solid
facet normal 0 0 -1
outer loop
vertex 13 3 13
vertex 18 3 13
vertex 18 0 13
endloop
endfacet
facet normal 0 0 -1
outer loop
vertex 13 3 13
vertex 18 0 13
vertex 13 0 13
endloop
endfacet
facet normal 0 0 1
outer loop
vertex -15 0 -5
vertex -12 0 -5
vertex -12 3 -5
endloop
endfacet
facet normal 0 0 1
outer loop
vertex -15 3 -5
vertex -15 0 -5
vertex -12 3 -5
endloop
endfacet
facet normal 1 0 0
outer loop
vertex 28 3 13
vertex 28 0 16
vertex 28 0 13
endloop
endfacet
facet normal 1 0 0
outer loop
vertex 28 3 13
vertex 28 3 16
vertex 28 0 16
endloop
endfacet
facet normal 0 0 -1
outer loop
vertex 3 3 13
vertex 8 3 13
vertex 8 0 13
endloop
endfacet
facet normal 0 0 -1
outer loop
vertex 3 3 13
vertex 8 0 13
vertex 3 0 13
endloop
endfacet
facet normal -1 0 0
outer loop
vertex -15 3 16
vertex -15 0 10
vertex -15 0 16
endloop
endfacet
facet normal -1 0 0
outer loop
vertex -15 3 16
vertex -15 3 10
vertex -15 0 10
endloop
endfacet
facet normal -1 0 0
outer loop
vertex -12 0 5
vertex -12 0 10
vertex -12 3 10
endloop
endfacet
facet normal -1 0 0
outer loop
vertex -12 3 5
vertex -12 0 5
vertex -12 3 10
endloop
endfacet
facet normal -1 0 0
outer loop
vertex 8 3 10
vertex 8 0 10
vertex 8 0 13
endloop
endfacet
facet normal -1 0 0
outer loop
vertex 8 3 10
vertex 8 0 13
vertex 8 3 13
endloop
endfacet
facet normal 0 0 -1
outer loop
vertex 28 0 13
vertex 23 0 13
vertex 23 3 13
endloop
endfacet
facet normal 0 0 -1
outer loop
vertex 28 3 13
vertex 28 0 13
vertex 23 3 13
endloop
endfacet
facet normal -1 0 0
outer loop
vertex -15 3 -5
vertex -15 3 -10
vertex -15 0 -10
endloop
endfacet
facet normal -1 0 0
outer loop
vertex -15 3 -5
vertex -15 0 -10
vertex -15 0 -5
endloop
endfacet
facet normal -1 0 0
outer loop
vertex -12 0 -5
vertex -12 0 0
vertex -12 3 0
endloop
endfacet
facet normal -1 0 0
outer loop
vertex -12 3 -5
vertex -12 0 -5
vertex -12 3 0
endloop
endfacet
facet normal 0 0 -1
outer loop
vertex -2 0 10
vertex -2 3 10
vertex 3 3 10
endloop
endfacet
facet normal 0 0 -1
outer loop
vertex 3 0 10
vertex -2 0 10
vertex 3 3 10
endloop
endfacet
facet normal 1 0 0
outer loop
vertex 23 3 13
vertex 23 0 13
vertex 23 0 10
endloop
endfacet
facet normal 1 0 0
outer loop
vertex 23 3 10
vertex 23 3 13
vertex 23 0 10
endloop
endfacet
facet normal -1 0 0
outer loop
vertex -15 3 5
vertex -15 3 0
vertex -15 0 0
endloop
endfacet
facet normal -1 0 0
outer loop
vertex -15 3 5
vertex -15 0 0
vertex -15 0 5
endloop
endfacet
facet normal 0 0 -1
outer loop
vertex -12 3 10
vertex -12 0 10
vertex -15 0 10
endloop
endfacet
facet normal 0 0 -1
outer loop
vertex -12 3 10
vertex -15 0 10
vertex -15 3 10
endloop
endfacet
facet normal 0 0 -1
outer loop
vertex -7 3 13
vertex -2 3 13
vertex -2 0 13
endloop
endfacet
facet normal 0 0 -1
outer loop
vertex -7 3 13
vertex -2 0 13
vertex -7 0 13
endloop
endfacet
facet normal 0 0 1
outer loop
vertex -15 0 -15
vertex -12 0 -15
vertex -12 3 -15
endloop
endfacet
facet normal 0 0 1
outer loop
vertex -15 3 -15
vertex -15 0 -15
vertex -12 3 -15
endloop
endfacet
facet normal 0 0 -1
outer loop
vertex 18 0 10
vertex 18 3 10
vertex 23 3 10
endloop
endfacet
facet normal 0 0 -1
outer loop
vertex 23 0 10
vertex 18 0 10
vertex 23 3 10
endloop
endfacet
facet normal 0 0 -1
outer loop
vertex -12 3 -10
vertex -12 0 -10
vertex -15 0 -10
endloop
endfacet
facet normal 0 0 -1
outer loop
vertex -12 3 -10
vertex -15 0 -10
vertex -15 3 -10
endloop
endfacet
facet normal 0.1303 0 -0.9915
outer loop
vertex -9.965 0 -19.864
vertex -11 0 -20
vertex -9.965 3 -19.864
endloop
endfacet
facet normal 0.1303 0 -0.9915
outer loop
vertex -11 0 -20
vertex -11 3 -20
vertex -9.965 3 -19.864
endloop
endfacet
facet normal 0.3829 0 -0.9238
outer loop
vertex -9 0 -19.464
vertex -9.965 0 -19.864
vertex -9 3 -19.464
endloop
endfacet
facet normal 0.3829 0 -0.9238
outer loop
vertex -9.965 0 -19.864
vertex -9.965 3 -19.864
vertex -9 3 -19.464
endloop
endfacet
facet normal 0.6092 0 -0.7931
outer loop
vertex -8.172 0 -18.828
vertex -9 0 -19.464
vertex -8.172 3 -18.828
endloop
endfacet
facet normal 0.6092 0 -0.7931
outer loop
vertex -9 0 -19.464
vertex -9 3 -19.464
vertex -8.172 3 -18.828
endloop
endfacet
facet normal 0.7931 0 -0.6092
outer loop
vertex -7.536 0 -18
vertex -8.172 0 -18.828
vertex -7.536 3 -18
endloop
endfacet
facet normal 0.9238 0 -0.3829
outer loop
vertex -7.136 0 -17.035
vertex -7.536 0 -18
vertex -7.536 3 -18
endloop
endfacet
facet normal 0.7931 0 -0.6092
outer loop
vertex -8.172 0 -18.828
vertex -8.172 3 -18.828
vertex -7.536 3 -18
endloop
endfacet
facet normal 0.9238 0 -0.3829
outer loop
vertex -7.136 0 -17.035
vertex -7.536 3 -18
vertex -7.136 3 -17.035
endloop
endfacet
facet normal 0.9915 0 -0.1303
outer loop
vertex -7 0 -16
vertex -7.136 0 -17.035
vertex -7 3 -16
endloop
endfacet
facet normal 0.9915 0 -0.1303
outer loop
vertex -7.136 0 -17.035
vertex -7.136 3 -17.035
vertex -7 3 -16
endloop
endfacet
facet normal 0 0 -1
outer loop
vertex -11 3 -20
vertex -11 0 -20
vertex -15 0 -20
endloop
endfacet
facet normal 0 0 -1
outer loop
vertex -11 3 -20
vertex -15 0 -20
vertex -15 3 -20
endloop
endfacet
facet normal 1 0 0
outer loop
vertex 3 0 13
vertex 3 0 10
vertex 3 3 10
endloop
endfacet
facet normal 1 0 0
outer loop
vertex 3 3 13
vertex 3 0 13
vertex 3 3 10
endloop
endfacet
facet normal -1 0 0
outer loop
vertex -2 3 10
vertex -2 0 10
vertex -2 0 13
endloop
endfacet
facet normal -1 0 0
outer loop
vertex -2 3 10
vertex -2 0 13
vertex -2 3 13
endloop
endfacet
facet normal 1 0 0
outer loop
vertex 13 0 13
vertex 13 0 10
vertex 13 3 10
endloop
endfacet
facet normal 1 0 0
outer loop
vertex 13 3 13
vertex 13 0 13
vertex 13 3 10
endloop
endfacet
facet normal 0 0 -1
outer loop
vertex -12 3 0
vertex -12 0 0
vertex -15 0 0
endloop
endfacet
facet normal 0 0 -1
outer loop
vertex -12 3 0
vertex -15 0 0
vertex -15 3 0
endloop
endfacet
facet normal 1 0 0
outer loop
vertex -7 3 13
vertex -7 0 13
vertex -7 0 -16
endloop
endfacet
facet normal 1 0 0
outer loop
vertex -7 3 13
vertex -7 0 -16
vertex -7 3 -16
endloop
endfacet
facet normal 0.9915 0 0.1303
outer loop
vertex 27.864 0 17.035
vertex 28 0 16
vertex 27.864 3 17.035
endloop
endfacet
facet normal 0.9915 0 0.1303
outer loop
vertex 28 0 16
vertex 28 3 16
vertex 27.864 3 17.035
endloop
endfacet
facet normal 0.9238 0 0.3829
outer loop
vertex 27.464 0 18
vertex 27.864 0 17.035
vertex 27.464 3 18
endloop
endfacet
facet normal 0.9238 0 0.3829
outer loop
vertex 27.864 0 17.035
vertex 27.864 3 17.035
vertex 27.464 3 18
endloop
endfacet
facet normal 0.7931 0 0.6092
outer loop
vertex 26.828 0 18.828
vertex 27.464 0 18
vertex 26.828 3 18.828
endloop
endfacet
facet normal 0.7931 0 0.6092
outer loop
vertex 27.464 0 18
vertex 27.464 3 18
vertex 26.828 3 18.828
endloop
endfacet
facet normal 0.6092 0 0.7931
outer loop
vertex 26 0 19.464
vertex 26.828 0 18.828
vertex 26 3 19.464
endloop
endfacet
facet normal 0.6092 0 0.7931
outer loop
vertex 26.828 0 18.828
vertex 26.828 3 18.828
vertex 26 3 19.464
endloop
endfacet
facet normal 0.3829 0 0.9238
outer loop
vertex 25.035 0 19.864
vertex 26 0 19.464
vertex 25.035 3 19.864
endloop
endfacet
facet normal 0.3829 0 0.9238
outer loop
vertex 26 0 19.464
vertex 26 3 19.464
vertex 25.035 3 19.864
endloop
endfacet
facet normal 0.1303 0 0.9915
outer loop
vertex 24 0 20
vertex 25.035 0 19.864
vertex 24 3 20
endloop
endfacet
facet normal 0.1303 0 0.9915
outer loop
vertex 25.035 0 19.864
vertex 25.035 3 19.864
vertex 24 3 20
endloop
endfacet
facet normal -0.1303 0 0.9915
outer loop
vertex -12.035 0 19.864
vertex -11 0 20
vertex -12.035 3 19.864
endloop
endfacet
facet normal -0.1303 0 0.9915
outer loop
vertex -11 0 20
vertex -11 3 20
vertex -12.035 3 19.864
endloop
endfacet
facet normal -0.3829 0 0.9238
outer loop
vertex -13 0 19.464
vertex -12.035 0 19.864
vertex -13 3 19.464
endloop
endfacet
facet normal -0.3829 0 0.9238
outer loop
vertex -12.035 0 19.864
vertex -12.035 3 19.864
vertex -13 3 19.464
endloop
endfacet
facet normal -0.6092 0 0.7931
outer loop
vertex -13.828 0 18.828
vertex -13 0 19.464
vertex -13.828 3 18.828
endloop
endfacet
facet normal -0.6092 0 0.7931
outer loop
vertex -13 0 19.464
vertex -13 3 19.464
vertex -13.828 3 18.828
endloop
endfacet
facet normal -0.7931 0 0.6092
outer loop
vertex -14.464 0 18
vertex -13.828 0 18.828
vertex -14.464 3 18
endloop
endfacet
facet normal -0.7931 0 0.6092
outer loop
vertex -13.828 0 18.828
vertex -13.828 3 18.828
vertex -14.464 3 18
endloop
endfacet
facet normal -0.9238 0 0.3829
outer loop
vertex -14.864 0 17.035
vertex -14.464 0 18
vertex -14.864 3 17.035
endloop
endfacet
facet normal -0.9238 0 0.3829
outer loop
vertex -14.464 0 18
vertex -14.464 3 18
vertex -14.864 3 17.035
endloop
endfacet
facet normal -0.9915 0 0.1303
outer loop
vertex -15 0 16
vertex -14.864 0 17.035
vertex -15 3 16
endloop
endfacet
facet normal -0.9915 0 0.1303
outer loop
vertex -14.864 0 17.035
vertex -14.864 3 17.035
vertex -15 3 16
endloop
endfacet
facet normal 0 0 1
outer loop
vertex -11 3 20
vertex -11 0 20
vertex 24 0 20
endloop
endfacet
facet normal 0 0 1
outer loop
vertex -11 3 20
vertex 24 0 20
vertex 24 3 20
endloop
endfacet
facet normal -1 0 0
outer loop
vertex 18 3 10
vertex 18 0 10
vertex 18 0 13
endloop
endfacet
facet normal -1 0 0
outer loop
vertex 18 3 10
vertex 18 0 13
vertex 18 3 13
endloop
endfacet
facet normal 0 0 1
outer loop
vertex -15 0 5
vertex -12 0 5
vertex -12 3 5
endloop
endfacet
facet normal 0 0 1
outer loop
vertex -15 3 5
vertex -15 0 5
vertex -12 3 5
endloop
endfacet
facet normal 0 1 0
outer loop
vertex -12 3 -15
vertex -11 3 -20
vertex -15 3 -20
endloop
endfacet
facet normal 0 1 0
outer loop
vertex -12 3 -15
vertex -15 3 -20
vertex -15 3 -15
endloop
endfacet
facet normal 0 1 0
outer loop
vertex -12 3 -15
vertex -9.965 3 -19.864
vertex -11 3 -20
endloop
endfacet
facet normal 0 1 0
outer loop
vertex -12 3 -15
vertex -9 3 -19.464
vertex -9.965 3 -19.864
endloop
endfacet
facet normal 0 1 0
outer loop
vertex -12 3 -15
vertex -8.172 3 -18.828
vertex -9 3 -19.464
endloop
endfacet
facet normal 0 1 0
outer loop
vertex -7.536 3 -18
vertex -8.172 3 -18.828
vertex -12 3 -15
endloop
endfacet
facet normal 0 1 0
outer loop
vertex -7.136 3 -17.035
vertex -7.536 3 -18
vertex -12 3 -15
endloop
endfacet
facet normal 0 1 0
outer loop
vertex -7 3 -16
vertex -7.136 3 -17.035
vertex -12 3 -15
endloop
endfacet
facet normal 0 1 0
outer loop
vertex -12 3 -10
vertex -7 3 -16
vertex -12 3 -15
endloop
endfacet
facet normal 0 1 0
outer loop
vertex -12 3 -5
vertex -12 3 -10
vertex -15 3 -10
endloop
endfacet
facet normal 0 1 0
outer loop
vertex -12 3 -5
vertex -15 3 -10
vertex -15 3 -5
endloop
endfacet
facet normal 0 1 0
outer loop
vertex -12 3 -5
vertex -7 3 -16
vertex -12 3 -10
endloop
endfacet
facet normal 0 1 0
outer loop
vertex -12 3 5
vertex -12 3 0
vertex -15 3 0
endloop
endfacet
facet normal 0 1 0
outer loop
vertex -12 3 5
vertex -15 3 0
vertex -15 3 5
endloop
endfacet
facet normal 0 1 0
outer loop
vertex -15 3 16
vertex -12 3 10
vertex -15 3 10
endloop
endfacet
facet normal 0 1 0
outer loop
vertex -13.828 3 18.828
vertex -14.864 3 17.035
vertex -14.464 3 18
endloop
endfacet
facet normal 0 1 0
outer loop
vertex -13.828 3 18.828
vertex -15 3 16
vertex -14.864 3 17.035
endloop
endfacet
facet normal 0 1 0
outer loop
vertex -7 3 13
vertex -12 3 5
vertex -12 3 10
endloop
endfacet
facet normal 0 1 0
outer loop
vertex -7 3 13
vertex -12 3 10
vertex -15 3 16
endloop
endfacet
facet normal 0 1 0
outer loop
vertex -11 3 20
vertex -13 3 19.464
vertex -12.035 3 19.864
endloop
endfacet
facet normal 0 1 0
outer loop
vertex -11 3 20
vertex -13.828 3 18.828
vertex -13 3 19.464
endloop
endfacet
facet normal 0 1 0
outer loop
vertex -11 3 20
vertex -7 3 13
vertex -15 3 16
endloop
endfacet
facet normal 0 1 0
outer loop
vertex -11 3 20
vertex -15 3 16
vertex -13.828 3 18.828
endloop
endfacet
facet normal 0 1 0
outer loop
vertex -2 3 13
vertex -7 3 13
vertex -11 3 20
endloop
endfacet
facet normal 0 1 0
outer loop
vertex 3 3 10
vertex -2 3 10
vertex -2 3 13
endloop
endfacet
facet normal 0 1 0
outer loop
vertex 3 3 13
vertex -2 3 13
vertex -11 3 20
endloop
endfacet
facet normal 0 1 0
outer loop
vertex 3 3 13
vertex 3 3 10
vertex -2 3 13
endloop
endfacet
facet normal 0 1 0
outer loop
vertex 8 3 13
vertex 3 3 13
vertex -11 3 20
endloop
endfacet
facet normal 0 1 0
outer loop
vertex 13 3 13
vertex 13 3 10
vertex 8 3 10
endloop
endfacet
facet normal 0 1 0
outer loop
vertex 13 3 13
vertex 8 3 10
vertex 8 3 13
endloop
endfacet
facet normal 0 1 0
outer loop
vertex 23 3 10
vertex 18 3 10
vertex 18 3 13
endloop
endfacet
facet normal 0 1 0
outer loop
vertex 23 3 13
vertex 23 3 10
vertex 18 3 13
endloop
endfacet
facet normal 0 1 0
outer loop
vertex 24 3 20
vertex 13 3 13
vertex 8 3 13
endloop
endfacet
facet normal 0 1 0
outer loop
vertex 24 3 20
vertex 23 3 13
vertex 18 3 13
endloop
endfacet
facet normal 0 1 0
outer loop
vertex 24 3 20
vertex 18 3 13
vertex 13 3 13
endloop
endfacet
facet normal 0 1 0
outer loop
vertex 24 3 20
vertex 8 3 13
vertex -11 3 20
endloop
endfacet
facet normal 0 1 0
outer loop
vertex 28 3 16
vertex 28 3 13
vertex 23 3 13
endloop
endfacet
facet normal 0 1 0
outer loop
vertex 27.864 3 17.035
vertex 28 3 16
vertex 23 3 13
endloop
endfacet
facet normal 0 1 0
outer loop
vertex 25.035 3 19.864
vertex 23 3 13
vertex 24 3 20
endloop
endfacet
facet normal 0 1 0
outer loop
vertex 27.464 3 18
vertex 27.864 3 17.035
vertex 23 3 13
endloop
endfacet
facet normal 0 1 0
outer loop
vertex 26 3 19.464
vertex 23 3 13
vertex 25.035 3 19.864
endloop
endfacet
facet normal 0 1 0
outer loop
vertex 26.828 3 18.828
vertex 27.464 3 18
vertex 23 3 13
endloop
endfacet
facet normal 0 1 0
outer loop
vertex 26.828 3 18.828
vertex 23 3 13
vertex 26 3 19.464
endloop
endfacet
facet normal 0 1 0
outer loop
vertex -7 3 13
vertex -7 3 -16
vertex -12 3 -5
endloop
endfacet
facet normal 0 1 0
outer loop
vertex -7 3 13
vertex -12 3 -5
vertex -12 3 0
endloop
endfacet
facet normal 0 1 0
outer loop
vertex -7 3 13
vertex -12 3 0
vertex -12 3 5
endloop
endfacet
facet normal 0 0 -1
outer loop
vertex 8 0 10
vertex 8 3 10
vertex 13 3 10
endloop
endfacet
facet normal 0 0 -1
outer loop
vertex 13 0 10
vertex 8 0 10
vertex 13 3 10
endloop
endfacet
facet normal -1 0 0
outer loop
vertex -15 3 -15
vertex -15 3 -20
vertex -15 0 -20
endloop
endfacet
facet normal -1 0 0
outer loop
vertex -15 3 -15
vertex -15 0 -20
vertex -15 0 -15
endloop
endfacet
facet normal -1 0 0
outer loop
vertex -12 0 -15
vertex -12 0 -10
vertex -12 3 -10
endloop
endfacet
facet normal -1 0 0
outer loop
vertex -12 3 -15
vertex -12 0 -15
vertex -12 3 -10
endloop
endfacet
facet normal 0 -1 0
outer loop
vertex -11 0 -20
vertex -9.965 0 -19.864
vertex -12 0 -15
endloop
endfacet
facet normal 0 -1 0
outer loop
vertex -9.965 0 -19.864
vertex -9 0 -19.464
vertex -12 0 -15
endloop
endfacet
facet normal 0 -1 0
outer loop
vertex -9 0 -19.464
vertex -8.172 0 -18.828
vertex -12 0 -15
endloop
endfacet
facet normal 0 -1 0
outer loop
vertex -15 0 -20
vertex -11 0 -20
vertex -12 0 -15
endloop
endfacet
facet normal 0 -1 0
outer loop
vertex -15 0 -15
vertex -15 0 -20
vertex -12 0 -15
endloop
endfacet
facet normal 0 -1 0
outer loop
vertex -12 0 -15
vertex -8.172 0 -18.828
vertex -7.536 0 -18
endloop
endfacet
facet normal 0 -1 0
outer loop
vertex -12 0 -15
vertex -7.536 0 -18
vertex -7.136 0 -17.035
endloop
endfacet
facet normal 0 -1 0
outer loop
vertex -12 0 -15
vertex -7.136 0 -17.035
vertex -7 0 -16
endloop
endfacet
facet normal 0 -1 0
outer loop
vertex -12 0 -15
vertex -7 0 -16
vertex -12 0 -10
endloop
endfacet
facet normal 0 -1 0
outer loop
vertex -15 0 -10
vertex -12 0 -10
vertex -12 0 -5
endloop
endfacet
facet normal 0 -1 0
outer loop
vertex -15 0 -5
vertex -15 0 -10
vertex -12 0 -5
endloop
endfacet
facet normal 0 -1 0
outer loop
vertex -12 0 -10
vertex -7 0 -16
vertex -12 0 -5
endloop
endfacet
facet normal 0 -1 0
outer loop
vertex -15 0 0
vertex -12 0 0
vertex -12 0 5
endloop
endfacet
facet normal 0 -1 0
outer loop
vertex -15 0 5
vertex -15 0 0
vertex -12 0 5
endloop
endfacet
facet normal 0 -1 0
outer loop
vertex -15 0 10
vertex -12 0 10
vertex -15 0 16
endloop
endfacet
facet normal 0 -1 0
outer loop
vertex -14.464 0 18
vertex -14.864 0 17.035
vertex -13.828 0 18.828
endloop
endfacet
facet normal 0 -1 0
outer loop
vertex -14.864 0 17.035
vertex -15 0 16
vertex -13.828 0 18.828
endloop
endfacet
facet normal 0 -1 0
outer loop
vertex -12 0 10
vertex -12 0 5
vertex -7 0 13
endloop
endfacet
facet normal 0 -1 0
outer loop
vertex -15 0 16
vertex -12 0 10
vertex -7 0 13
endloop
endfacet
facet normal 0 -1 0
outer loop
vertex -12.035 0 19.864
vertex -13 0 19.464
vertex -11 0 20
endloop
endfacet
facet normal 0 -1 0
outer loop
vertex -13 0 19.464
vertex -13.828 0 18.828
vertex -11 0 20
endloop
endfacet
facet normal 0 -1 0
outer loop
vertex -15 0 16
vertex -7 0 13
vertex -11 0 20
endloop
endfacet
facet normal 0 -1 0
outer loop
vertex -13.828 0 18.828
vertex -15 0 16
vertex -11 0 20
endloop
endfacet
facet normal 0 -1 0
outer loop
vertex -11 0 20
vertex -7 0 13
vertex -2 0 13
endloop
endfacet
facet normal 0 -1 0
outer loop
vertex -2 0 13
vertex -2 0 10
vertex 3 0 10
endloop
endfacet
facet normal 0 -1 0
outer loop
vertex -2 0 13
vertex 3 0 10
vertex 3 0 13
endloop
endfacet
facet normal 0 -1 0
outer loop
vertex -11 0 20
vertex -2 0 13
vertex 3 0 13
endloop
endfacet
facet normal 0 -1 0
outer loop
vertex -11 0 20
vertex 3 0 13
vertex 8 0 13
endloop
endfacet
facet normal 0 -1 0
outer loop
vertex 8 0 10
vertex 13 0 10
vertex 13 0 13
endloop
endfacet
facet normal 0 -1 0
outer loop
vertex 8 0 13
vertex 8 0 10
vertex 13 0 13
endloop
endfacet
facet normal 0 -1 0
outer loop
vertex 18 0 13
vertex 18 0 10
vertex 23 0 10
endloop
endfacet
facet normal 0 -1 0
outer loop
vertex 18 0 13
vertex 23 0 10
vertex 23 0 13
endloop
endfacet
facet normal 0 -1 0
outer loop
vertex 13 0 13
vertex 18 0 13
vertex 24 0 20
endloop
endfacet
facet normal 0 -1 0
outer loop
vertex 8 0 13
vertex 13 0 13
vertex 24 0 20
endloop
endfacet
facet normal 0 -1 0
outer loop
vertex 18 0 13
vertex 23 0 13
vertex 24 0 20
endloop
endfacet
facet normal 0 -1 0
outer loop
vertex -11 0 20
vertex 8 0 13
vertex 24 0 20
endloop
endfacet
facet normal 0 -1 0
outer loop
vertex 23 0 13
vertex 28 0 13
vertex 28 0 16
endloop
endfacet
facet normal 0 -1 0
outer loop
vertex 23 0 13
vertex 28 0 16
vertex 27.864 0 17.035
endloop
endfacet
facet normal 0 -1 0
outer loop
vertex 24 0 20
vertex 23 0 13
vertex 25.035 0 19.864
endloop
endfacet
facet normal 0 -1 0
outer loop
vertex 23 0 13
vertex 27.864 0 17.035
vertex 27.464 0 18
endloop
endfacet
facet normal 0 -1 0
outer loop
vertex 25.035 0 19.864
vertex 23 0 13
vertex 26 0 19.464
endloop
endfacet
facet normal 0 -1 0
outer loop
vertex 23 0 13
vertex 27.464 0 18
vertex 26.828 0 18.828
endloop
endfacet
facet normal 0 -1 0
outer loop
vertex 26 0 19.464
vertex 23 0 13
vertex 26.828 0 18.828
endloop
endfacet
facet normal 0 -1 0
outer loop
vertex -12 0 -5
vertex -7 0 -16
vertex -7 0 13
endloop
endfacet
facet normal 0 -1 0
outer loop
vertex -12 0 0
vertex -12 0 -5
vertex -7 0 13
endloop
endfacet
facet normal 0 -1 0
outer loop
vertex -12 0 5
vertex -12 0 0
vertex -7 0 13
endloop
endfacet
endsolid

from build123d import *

# Parameters (mm, degrees)
SKETCH1_W           = 46
SKETCH1_H           = 40
BOSS_EXTRUDE1_DEPTH = 3
SKETCH3_W           = 35
SKETCH3_H           = 30
CUT_EXTRUDE1_DEPTH  = 3
SKETCH4_W           = 5
SKETCH4_H           = 3
CUT_EXTRUDE3_DEPTH  = 3
SKETCH6_W           = 7
SKETCH6_H           = 3
BOSS_EXTRUDE2_DEPTH = 5
SKETCH7_W           = 11
SKETCH7_H           = 40
CUT_EXTRUDE4_DEPTH  = 3
SKETCH8_W           = 5
SKETCH8_H           = 3
BOSS_EXTRUDE3_DEPTH = 30
SKETCH9_W           = 5
SKETCH9_H           = 3
SKETCH9_W_2         = 10
BOSS_EXTRUDE4_DEPTH = 3
FILLET2_R           = 4


with BuildPart() as part:
    # Sketch1 → Boss-Extrude1 (new body)
    with BuildSketch(Plane(origin=(0, 0, 0), x_dir=(1, 0, 0), z_dir=(0, 1, 0))):
        Rectangle(SKETCH1_W, SKETCH1_H)
    extrude(amount=BOSS_EXTRUDE1_DEPTH)

    # Sketch3 → Cut-Extrude1 (cut)
    with BuildSketch(Plane(origin=(0, 3, 0), x_dir=(1, 0, 0), z_dir=(0, 1, 0))):
        with Locations((5.5, 5)):
            Rectangle(SKETCH3_W, SKETCH3_H)
    extrude(amount=-CUT_EXTRUDE1_DEPTH, mode=Mode.SUBTRACT)

    # Sketch4 → Cut-Extrude3 (cut)
    with BuildSketch(Plane(origin=(0, 0, 10), x_dir=(-1, 0, 0), z_dir=(0, 0, -1))):
        with Locations((-15.5, 1.5)):
            Rectangle(SKETCH4_W, SKETCH4_H)
        with Locations((-5.5, 1.5)):
            Rectangle(SKETCH4_W, SKETCH4_H)
        with Locations((4.5, 1.5)):
            Rectangle(SKETCH4_W, SKETCH4_H)
    extrude(amount=-CUT_EXTRUDE3_DEPTH, mode=Mode.SUBTRACT)

    # Sketch6 → Boss-Extrude2 (add)
    with BuildSketch(Plane(origin=(23, 0, 0), x_dir=(0, 0, -1), z_dir=(1, 0, 0))):
        with Locations((-16.5, 1.5)):
            Rectangle(SKETCH6_W, SKETCH6_H)
    extrude(amount=BOSS_EXTRUDE2_DEPTH)

    # Sketch7 → Cut-Extrude4 (cut)
    with BuildSketch(Plane.XZ):
        with Locations((-17.5, 0)):
            Rectangle(SKETCH7_W, SKETCH7_H)
    extrude(amount=-CUT_EXTRUDE4_DEPTH, mode=Mode.SUBTRACT)

    # Sketch8 → Boss-Extrude3 (add)
    with BuildSketch(Plane(origin=(0, 0, 10), x_dir=(-1, 0, 0), z_dir=(0, 0, -1))):
        with Locations((9.5, 1.5)):
            Rectangle(SKETCH8_W, SKETCH8_H)
    extrude(amount=BOSS_EXTRUDE3_DEPTH)

    # Sketch9 → Boss-Extrude4 (add)
    with BuildSketch(Plane.ZY.offset(12)):
        with Locations((-17.5, 1.5)):
            Rectangle(SKETCH9_W, SKETCH9_H)
        with Locations((-7.5, 1.5)):
            Rectangle(SKETCH9_W, SKETCH9_H)
        with Locations((2.5, 1.5)):
            Rectangle(SKETCH9_W, SKETCH9_H)
        with Locations((15, 1.5)):
            Rectangle(SKETCH9_W_2, SKETCH9_H)
    extrude(amount=BOSS_EXTRUDE4_DEPTH)

    # Fillet2
    fillet2_edges = [part.edges().sort_by_distance(p)[0] for p in [
        (-7, 1.5, -20),
        (-15, 1.5, 20),
        (28, 1.5, 20),
    ]]
    fillet(fillet2_edges, radius=FILLET2_R)


solid = part.part
